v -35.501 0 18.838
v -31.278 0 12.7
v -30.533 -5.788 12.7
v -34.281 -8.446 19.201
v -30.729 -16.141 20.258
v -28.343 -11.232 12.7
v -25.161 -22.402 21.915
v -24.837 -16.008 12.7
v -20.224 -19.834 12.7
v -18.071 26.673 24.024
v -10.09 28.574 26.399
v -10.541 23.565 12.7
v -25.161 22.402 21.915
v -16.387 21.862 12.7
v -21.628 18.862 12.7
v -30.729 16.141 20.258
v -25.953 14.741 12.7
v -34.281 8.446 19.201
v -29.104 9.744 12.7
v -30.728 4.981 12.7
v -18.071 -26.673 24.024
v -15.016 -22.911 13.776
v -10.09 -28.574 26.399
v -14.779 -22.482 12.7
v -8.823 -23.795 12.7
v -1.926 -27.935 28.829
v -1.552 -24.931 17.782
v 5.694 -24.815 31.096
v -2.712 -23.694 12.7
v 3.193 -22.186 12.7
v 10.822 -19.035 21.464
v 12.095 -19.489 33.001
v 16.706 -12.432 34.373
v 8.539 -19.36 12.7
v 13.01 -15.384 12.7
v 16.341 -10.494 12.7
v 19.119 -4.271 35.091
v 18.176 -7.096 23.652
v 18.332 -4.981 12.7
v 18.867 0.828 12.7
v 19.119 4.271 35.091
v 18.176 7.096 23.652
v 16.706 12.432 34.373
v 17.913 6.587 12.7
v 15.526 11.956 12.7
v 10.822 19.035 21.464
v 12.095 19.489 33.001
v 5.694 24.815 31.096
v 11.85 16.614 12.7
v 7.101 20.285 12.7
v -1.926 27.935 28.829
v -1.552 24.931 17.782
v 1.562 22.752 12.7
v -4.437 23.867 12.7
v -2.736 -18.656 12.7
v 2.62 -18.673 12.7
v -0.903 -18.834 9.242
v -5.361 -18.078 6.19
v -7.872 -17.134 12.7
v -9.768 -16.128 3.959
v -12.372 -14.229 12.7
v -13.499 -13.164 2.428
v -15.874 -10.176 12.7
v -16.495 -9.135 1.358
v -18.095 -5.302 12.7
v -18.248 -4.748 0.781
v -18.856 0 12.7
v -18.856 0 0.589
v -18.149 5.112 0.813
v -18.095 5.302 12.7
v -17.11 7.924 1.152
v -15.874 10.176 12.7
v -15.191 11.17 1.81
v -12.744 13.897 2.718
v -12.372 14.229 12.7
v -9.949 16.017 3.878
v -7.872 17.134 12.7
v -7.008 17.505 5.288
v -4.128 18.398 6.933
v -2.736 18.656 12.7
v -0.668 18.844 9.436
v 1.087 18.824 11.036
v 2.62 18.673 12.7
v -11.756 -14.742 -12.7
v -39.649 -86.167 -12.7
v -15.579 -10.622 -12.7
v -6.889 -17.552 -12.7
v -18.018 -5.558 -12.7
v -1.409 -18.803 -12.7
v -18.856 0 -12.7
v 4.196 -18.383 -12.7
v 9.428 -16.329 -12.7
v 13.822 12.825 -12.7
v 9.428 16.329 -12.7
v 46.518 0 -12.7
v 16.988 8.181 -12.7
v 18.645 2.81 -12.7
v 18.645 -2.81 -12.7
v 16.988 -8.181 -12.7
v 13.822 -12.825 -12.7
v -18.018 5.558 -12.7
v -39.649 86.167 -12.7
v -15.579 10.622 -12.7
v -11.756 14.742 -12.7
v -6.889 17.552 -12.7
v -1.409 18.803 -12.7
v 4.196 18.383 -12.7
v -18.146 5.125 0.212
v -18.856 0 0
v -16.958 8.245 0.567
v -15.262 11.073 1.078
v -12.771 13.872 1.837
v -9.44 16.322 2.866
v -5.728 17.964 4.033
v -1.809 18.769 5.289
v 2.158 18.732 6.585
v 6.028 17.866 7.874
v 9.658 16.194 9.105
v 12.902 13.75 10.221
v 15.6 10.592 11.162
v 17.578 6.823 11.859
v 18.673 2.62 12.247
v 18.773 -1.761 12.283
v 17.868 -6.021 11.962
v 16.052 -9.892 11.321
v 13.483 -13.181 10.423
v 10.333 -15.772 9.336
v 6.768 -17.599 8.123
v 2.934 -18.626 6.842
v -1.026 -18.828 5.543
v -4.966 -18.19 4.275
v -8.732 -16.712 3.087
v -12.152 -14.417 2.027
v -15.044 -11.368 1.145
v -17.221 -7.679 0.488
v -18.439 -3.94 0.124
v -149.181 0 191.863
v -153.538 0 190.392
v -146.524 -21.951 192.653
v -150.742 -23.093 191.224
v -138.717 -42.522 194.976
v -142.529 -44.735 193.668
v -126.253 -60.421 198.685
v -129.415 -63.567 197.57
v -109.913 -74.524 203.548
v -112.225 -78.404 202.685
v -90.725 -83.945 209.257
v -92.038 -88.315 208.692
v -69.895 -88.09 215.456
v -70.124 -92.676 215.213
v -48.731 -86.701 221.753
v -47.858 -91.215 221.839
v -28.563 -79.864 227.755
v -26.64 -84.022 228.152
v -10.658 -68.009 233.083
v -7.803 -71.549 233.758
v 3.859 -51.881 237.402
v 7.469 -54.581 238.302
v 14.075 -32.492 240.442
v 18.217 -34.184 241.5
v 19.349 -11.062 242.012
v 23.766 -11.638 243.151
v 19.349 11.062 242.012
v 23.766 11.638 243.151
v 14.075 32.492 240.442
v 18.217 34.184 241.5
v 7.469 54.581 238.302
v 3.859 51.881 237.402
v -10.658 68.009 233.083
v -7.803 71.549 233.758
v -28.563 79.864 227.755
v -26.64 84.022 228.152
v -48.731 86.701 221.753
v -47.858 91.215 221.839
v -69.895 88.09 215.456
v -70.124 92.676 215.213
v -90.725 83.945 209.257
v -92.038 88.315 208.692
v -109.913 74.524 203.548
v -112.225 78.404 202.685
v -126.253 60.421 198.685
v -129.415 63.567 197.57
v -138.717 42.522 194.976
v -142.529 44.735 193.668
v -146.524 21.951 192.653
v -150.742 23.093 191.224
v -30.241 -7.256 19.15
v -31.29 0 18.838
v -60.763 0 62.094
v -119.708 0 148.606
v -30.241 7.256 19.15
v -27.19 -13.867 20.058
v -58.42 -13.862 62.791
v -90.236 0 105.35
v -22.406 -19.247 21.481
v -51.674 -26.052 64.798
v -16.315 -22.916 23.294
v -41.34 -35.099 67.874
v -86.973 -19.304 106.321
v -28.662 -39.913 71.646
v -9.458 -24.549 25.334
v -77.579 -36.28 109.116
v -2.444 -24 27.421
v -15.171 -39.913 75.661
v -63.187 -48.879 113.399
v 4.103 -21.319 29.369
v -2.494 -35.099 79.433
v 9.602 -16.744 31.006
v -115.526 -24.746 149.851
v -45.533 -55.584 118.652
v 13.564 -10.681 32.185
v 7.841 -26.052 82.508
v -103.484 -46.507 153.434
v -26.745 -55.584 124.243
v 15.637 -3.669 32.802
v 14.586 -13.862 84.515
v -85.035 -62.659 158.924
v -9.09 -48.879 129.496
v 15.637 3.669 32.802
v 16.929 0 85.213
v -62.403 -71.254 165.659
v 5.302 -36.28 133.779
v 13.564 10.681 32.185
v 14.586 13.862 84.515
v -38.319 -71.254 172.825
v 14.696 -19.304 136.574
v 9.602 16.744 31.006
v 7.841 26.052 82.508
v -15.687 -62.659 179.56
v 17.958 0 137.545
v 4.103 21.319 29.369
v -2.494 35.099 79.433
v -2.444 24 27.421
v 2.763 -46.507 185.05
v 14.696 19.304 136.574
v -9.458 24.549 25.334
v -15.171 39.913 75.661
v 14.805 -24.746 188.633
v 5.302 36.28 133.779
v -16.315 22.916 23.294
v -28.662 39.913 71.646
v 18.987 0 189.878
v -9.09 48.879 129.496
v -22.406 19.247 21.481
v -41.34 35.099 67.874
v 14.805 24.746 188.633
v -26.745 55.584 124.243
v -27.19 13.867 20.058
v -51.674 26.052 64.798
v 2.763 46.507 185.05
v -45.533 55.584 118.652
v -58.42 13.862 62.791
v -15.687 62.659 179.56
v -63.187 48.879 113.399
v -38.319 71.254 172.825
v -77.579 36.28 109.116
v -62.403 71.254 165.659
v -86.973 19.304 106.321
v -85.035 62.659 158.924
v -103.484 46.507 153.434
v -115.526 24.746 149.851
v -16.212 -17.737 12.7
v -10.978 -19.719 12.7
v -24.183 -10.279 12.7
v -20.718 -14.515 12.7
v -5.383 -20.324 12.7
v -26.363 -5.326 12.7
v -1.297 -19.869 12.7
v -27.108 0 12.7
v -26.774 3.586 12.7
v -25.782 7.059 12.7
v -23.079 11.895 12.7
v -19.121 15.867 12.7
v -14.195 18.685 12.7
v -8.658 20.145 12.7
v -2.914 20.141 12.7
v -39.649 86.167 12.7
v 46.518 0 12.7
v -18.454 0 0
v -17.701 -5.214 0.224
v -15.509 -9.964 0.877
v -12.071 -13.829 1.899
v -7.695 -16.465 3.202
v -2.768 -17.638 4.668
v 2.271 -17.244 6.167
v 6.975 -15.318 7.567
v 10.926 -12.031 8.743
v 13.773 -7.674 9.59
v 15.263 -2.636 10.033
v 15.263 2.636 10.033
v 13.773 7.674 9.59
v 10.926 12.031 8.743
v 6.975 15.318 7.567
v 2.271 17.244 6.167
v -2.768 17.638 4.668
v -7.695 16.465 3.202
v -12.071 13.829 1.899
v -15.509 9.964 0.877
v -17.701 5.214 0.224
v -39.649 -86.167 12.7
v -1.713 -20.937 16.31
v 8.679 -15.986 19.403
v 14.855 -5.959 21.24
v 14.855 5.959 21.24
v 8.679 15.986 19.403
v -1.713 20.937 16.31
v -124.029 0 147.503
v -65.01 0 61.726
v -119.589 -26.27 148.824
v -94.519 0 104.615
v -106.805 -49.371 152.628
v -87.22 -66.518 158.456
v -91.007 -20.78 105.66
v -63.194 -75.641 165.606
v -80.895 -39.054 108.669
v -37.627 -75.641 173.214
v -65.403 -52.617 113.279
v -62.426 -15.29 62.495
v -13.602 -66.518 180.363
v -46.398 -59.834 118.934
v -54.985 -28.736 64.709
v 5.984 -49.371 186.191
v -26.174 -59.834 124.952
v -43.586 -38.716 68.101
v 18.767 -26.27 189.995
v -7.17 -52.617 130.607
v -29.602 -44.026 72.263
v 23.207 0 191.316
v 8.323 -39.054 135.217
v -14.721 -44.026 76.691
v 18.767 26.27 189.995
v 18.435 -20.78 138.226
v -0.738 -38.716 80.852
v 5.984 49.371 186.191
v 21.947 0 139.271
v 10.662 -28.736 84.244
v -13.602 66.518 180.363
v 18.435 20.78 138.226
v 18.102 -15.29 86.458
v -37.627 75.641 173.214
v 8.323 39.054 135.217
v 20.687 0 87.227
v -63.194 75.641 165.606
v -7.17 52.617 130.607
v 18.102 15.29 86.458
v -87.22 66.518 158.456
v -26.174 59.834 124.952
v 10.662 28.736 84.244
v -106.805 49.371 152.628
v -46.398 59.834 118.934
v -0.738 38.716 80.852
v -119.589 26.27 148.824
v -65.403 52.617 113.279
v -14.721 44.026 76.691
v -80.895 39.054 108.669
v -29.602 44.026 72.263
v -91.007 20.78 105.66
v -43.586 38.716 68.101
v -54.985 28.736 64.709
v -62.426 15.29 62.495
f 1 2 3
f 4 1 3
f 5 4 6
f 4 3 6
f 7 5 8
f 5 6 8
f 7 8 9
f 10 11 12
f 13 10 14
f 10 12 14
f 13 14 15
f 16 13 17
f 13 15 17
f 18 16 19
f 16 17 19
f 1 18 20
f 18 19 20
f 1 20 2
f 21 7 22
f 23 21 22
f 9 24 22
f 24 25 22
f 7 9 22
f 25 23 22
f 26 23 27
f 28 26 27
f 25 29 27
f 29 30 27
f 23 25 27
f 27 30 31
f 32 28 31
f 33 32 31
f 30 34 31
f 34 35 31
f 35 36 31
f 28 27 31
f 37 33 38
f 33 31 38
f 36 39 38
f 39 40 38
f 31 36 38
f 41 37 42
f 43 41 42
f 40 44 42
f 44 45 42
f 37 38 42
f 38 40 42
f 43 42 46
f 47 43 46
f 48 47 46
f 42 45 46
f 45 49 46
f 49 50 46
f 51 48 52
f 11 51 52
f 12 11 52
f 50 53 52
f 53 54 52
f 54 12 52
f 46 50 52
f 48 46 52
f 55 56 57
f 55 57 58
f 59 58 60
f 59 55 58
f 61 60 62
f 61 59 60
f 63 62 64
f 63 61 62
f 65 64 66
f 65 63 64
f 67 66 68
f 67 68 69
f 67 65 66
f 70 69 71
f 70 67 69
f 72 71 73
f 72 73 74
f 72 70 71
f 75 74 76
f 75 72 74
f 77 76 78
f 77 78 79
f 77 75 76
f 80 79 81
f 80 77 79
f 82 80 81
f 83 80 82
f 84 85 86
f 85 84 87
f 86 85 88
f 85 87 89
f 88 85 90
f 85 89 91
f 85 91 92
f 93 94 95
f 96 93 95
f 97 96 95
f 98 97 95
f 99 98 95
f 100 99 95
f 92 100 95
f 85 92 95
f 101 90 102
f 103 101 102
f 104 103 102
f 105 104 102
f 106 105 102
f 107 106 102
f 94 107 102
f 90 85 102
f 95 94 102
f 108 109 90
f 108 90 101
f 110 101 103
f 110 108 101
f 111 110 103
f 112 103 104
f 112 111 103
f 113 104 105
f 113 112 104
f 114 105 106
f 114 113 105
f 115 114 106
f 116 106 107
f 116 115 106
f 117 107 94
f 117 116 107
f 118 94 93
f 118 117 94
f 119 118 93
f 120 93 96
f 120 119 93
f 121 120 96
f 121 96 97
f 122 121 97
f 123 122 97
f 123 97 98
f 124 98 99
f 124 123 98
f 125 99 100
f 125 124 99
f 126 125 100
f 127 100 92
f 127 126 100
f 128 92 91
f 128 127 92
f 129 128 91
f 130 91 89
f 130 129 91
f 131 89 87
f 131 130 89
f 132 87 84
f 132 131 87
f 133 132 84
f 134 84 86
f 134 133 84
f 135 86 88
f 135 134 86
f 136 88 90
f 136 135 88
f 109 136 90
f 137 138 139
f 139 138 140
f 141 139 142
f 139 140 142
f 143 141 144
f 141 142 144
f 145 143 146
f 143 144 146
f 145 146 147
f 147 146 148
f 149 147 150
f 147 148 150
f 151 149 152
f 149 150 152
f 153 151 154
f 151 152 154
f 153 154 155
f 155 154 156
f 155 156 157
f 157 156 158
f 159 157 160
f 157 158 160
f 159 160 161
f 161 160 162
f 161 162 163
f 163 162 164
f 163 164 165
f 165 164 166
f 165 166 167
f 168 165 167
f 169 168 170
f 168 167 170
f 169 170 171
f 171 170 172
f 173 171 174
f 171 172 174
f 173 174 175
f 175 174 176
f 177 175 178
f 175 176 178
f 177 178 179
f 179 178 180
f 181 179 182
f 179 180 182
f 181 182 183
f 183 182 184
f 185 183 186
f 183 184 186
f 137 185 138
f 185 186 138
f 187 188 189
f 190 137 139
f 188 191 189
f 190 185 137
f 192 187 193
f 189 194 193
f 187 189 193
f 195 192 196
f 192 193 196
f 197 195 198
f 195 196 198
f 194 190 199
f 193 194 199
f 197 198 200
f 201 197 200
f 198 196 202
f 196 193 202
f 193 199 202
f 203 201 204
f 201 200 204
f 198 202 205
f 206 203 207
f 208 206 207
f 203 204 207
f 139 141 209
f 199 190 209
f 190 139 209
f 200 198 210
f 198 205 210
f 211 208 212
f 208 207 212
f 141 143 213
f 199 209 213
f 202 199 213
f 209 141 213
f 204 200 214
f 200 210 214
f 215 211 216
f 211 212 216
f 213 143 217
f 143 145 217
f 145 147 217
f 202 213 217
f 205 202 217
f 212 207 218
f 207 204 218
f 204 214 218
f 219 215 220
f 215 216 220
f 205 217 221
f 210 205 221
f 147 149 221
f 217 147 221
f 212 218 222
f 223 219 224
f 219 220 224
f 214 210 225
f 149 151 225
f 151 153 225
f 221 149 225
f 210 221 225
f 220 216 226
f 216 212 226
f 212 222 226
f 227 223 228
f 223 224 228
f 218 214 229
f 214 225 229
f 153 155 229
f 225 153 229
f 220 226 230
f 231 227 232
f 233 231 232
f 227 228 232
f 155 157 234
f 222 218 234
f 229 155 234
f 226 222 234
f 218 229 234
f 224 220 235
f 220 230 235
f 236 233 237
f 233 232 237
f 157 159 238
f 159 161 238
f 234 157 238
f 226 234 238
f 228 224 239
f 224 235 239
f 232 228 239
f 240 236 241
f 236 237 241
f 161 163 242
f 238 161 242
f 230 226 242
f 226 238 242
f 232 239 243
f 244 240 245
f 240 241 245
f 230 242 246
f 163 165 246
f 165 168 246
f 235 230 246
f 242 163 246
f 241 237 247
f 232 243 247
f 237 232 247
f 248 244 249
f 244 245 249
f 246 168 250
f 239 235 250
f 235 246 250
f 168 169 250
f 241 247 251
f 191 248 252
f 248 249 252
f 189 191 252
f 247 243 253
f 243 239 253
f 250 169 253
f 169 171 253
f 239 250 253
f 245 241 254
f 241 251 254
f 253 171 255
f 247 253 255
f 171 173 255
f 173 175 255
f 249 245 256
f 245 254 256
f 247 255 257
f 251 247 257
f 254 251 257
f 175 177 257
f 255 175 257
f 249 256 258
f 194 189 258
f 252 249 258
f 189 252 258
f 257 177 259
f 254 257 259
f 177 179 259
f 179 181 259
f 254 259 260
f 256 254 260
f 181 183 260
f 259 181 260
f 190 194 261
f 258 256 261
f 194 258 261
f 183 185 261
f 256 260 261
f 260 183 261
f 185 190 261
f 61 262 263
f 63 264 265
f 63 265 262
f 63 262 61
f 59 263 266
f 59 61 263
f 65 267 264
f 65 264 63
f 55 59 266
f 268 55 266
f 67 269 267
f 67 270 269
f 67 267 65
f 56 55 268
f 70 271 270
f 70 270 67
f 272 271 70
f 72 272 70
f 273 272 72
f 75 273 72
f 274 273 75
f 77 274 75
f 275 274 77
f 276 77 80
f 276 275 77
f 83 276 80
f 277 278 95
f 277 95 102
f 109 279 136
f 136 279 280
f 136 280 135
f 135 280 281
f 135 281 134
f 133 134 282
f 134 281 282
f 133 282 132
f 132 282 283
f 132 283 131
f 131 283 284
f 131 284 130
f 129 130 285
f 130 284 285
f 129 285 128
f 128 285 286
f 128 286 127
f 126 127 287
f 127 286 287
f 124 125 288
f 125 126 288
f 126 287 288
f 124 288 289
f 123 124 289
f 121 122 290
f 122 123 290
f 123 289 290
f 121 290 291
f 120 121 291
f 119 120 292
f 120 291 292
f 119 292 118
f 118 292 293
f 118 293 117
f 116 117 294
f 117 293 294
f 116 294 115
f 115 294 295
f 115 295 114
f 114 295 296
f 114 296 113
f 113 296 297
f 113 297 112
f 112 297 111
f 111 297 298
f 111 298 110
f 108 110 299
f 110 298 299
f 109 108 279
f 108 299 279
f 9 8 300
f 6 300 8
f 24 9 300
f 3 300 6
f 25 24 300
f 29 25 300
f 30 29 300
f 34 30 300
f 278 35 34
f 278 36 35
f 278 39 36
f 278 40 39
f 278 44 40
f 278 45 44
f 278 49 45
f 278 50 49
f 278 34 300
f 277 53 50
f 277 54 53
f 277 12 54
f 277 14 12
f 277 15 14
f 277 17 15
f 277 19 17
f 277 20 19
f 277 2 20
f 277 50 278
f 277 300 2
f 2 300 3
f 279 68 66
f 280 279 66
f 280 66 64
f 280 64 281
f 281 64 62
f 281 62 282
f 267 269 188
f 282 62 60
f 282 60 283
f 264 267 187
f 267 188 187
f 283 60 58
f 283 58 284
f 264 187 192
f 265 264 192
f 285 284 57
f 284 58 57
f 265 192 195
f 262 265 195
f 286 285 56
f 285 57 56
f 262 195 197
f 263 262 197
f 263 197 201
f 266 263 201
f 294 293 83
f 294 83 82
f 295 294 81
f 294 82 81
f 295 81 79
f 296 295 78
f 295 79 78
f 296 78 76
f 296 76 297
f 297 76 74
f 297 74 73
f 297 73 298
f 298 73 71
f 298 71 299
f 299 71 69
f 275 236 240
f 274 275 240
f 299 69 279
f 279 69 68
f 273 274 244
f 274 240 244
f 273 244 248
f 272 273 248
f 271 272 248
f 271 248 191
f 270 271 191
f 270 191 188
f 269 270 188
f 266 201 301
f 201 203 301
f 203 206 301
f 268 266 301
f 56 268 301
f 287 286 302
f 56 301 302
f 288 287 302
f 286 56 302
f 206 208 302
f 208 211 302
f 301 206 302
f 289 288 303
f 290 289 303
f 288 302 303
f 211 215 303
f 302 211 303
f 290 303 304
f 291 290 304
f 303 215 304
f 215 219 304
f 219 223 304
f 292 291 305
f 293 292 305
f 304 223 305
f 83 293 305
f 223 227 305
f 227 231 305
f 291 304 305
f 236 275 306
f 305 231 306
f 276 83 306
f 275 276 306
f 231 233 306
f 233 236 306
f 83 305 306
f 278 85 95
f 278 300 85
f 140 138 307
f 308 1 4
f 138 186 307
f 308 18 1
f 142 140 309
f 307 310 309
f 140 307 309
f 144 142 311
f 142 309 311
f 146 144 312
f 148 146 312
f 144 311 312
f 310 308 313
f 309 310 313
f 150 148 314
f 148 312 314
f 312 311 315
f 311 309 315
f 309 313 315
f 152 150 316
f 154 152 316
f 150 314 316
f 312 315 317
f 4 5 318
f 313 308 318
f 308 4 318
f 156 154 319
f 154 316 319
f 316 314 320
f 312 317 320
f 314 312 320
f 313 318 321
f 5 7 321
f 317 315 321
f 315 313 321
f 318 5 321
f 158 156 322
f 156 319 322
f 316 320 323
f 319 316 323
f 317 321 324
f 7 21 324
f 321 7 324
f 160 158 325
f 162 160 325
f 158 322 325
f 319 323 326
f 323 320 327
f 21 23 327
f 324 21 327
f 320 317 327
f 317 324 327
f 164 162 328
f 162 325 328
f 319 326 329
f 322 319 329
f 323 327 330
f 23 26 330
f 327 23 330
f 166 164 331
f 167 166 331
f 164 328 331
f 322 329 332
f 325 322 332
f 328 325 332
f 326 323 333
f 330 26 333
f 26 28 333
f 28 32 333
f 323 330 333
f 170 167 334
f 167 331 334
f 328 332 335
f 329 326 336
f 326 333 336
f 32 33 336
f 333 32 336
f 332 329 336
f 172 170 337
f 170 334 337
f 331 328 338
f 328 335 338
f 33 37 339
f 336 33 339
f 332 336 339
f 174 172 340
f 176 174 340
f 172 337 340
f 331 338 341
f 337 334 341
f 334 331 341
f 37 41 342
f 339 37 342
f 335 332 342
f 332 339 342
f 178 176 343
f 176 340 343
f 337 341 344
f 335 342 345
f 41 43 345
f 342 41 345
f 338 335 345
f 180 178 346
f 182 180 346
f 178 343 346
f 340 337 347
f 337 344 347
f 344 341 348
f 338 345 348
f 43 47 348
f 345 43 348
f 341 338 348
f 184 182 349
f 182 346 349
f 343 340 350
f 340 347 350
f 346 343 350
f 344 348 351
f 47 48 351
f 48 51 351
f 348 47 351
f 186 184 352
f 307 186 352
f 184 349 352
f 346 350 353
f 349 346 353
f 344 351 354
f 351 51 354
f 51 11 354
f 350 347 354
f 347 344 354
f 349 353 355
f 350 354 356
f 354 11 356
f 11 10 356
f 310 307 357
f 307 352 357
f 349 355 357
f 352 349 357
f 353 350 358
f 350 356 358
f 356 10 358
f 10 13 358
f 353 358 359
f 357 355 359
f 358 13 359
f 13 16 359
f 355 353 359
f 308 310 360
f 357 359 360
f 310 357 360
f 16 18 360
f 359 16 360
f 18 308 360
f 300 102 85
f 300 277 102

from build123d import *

# Parameters (mm, degrees)
F3_DEPTH = 12.7


with BuildPart() as f1:
    # F0 (on Front) → F1 (revolve)
    with BuildSketch(Plane.XZ):
        Polygon((-153.5377800465, 190.3918104444), (-35.5008375951, 18.8378337771), (-31.2896880625, 18.8378337771), (-149.1814106703, 191.8626129627), align=None)
        Polygon((-35.5008375951, 18.8378337771), (-22.5395507474, 0), (-18.4543896466, 0), (-31.2896880625, 18.8378337771), align=None)
    revolve(axis=Axis((-32.7495573248, 0, 110.0577637553), (-0.2852077577, 0, 0.9584657192)))

    # F2 (on Top) → F3 (join, symmetric)
    with BuildSketch(Plane.XY):
        with BuildLine():
            Line((-39.649366063, -86.1673603178), (46.5179942548, 0))
            Line((46.5179942548, 0), (18.8556073768, 0))
            ThreePointArc((18.8556073768, 0), (0, -18.8556073768), (-18.8556073768, 0))
            Line((-18.8556073768, 0), (-39.649366063, 0))
            Line((-39.649366063, 0), (-39.649366063, -86.1673603178))
        make_face()
        with BuildLine():
            Line((18.8556073768, 0), (46.5179942548, 0))
            Line((46.5179942548, 0), (-39.649366063, 86.1673603178))
            Line((-39.649366063, 86.1673603178), (-39.649366063, 0))
            Line((-39.649366063, 0), (-18.8556073768, 0))
            ThreePointArc((-18.8556073768, 0), (0, 18.8556073768), (18.8556073768, 0))
        make_face()
    extrude(amount=F3_DEPTH, both=True)


solid = f1.part
